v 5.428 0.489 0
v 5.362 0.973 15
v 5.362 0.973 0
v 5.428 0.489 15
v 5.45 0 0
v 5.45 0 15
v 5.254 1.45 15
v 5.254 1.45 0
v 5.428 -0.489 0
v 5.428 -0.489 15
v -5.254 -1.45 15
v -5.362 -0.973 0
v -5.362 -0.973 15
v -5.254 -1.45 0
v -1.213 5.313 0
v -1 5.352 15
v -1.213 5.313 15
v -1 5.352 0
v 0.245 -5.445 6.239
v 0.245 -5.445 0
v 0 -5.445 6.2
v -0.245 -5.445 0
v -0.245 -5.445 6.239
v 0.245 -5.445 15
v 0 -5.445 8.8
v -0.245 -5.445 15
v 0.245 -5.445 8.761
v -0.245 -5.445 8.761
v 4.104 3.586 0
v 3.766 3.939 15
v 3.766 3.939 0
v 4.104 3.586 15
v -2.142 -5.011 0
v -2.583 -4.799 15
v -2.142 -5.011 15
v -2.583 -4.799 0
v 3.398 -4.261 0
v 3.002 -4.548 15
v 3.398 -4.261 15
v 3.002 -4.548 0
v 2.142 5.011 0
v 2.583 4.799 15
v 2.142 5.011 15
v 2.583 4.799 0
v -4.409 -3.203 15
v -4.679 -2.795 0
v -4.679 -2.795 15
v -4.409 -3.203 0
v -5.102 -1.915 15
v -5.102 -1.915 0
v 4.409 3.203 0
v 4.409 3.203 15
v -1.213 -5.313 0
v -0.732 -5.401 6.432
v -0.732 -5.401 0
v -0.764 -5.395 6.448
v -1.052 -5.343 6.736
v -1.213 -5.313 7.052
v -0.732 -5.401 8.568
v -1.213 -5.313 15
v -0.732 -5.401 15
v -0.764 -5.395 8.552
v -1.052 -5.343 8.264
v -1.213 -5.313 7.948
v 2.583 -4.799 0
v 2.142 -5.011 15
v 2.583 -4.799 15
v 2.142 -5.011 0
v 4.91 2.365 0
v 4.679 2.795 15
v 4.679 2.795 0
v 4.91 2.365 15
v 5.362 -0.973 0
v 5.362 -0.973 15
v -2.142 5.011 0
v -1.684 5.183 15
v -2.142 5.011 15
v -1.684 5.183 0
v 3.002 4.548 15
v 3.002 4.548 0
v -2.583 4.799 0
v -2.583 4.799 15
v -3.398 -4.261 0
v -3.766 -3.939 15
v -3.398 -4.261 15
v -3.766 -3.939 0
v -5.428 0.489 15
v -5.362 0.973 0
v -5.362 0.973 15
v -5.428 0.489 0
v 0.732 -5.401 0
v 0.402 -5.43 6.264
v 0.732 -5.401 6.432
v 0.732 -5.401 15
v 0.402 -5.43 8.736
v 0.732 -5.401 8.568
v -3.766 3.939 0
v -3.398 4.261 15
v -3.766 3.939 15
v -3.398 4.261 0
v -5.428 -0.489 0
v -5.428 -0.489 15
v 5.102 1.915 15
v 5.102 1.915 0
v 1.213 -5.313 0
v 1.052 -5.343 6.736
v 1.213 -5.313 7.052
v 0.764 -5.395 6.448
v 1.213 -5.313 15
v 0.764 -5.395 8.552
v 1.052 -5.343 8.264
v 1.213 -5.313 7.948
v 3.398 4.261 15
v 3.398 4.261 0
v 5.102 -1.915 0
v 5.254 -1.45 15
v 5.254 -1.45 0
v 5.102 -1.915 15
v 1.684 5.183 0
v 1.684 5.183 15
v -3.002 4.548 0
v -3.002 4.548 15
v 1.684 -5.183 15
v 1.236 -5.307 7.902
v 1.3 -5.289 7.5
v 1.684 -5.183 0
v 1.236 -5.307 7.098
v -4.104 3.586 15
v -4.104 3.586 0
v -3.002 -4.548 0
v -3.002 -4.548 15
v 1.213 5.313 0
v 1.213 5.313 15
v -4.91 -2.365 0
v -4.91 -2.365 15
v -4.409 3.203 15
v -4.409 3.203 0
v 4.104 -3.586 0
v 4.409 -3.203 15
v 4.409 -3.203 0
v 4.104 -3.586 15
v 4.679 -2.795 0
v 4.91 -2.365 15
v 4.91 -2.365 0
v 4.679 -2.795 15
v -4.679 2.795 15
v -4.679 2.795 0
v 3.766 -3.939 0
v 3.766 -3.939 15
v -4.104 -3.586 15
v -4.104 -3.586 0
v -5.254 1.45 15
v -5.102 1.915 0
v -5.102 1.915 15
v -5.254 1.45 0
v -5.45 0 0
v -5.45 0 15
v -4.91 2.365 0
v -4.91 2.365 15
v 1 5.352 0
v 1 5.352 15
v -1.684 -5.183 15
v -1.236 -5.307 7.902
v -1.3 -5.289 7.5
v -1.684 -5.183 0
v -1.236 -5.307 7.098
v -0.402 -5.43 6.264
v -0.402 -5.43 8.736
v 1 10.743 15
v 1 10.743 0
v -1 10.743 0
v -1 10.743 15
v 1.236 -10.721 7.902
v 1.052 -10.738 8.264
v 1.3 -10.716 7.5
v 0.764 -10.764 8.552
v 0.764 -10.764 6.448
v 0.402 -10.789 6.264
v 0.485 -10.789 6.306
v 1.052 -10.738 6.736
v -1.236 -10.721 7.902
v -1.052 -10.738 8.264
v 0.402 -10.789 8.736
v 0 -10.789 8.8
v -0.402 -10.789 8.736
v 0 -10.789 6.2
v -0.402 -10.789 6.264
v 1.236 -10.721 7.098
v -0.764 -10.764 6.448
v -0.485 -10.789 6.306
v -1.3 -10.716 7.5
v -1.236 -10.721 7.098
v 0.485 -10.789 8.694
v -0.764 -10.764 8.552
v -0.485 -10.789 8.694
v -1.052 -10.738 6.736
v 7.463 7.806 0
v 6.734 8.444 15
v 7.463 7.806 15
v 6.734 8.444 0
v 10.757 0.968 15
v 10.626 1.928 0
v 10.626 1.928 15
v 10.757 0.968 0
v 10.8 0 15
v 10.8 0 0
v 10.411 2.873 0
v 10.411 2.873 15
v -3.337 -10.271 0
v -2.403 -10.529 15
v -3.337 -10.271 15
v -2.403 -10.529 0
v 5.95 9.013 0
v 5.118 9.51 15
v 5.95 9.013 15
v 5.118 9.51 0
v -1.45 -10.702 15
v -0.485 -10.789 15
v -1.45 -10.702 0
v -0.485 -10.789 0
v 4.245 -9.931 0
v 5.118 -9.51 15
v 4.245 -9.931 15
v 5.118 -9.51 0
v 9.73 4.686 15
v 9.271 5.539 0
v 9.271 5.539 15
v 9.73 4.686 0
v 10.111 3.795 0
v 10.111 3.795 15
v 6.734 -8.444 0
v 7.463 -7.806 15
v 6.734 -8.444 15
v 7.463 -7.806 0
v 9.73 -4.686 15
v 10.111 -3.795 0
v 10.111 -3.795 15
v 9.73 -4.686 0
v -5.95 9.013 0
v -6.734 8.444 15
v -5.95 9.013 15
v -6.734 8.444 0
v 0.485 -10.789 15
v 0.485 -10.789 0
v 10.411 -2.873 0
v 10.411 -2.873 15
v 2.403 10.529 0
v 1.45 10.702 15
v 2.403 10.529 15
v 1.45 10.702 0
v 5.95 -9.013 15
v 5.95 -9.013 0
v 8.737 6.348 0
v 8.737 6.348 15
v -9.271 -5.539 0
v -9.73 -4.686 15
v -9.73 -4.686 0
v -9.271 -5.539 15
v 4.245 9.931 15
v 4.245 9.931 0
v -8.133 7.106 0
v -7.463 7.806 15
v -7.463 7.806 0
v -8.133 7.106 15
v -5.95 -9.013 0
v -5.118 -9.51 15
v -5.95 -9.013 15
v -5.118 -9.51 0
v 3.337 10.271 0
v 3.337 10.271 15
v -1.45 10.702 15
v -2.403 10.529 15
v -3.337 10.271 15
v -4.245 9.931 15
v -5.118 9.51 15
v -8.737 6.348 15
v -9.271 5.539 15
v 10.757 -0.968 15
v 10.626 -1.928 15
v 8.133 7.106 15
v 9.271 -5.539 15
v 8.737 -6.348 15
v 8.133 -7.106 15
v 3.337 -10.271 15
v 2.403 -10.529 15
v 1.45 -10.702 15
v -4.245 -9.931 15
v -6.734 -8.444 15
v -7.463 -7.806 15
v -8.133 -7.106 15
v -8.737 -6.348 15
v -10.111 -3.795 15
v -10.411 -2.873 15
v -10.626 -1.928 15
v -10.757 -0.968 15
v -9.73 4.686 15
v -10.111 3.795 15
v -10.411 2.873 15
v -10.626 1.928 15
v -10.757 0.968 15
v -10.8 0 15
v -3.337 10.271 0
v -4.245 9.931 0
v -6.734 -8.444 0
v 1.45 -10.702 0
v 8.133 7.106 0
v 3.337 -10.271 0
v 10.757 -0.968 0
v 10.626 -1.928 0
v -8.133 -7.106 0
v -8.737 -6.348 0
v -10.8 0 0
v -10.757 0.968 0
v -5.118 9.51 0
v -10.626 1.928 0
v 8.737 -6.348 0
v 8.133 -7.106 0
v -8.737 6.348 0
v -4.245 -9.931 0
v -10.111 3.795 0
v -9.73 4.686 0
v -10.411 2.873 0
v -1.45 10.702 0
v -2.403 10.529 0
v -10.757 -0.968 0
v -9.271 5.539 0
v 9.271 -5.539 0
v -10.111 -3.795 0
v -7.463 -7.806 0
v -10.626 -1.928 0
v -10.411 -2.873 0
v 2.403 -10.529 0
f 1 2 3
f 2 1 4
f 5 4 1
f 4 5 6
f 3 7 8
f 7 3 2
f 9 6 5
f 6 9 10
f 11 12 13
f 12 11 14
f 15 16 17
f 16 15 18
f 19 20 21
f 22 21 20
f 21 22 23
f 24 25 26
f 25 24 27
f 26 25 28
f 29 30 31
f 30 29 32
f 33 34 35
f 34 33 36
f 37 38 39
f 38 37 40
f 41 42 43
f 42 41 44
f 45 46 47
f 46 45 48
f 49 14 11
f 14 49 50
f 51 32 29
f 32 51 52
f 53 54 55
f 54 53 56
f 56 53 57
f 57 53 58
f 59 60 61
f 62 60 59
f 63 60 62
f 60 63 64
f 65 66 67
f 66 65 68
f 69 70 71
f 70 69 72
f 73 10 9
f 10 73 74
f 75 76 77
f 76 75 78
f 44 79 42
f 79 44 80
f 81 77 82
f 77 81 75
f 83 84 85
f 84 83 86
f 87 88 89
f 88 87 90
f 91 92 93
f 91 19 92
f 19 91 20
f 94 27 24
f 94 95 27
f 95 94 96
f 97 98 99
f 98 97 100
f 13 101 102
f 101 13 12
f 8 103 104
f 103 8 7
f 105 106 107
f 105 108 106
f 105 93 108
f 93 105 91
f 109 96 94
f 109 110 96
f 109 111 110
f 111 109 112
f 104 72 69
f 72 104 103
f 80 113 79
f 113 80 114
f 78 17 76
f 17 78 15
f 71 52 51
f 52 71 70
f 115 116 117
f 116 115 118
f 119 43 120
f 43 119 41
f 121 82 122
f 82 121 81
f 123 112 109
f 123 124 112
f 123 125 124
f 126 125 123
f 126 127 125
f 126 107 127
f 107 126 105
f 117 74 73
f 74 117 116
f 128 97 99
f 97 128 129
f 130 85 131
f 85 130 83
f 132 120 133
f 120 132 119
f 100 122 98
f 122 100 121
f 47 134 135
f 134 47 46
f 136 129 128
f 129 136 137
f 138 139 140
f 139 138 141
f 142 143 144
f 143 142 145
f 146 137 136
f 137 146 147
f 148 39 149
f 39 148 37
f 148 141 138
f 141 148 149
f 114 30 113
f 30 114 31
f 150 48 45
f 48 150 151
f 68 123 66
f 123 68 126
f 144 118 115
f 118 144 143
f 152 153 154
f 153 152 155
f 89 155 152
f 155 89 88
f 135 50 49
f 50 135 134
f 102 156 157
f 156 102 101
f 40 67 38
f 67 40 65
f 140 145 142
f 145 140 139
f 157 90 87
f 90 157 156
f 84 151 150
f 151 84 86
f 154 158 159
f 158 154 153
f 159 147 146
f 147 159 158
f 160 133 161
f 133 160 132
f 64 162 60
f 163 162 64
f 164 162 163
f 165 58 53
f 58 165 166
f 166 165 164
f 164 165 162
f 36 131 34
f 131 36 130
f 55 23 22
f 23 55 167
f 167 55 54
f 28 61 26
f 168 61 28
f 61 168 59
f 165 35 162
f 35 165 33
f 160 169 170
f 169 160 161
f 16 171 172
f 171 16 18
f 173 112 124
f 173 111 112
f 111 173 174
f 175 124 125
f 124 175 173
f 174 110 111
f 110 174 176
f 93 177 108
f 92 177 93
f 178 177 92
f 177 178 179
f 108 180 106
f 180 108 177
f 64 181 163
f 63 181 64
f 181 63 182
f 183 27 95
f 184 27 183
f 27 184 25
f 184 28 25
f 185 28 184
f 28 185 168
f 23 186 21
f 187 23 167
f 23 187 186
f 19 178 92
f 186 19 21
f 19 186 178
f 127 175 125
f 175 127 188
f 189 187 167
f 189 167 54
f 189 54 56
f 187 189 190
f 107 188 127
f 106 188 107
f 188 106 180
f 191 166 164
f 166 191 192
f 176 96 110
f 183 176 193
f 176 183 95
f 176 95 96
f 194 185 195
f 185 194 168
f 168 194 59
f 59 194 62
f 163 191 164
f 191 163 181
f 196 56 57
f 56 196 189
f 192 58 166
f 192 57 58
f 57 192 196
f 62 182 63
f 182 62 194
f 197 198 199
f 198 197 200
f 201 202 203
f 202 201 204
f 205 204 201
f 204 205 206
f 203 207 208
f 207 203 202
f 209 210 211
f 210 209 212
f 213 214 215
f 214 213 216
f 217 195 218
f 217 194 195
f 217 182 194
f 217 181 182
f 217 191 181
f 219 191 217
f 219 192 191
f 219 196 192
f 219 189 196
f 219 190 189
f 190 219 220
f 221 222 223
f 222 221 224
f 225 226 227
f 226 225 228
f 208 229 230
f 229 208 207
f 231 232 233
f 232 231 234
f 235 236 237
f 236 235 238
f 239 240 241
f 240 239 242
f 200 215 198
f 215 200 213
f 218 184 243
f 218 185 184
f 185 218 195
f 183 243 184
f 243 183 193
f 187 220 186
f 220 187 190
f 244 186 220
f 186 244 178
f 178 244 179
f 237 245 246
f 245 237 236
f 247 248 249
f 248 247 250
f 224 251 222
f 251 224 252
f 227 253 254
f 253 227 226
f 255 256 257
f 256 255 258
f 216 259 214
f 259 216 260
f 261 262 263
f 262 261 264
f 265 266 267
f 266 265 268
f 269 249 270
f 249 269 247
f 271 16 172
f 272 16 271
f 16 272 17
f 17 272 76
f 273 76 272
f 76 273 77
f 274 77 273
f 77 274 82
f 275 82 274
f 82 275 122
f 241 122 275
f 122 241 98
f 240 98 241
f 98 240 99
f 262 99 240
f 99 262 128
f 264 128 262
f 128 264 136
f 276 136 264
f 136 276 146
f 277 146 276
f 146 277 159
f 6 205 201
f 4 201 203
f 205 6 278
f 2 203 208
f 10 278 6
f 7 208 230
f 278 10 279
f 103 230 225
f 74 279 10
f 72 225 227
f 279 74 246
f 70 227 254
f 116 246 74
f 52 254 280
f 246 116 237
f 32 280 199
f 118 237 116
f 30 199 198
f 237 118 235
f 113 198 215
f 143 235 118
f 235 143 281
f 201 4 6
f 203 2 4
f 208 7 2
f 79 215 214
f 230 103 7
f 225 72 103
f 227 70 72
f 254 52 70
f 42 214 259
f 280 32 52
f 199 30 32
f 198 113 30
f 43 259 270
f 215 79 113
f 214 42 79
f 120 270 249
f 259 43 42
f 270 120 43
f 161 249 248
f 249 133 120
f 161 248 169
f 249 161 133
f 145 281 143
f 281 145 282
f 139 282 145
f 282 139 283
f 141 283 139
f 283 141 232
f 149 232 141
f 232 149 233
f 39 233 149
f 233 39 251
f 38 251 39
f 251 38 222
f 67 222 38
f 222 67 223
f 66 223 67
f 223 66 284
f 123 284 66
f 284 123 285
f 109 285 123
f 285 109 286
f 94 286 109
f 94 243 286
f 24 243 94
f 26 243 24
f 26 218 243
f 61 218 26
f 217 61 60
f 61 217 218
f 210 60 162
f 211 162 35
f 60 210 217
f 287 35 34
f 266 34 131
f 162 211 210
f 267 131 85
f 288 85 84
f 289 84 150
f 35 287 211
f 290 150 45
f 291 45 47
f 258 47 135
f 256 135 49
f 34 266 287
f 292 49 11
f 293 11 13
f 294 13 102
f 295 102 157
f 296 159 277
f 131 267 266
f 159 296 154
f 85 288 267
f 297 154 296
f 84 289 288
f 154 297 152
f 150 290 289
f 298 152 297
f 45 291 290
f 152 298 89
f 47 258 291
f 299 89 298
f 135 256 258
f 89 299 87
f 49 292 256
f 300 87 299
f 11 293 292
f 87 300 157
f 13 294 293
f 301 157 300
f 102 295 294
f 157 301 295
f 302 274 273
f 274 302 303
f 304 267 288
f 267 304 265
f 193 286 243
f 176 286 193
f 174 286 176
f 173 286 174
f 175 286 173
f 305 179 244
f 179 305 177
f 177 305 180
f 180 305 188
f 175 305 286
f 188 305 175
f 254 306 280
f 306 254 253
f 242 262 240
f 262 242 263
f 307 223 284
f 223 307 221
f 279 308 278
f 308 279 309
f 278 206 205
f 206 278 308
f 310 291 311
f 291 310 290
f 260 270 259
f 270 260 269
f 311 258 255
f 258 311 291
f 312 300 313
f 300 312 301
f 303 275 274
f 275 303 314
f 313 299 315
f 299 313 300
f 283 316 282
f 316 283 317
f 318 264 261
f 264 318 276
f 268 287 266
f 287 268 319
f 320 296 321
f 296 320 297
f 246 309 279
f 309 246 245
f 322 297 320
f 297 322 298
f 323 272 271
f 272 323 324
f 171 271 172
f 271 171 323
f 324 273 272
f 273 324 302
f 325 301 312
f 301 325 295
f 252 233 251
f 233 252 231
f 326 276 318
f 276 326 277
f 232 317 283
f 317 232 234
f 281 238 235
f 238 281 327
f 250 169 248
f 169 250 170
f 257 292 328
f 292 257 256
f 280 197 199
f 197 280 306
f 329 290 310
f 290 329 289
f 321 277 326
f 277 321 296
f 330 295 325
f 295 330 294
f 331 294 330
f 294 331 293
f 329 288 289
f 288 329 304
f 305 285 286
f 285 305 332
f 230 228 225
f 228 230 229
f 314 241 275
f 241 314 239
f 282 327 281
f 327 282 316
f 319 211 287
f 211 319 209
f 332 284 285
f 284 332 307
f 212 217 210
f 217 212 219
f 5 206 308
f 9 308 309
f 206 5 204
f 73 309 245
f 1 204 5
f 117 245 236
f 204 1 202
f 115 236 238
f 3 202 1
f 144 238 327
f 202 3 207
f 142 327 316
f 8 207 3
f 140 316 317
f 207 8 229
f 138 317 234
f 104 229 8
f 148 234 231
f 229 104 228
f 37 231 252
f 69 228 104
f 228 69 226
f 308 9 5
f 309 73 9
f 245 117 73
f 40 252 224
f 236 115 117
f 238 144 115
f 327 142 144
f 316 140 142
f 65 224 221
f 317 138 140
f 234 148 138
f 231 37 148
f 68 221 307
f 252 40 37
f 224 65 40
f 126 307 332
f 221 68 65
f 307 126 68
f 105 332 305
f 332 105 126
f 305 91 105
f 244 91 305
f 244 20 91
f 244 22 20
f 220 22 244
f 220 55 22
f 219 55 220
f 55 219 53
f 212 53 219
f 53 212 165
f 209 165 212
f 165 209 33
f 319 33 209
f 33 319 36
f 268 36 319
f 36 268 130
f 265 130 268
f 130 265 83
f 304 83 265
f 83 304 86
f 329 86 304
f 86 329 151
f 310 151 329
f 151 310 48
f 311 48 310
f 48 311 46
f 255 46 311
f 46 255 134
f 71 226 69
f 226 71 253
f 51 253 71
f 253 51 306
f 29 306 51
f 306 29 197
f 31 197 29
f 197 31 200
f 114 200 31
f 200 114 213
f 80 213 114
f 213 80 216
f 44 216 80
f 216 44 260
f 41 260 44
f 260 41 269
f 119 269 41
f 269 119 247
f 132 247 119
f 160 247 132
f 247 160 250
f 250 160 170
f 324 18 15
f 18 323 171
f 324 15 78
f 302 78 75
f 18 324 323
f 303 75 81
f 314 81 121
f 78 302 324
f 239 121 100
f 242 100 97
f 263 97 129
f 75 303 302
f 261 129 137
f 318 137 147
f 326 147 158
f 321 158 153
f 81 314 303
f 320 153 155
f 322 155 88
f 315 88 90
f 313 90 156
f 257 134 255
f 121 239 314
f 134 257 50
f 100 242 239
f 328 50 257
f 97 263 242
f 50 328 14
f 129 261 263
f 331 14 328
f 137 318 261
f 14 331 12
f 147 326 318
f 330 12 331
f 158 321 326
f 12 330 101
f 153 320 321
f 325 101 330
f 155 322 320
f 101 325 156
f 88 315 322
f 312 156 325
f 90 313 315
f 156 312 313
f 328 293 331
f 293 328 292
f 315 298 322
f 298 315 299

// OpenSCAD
//Diameter of the stylus
stylusDiameter=10.5;

//Tolerance (to OD and ID)
tolerance=0.2;

penAdapter();

module penAdapter(mountDiameter=22, mountHeight=15)
{

    difference () {
    
        cylinder(r=mountDiameter/2-tolerance, h= mountHeight, $fn=70);

        union () {
            stylusMount();
            space();
            m3Hole();
        }
    }
} 


module stylusMount (mountHeight=15) {

    translate([0,0,-1]) cylinder(r=stylusDiameter/2+tolerance, mountHeight+2, $fn=70);      
}

module space (mountDiameter=22, mountHeight=15, spaceSize=2) {
    
    translate([0,mountDiameter/2,mountHeight/2-1]) cube(size = [spaceSize, mountDiameter, mountHeight+10], center=true);
}

module m3Hole (mountHeight=15,mountDiameter=22) {
    
        rotate([90,0,0]) translate([0,mountHeight/2,0]) cylinder(r=2.6/2, mountDiameter/2, $fn=20);
}
